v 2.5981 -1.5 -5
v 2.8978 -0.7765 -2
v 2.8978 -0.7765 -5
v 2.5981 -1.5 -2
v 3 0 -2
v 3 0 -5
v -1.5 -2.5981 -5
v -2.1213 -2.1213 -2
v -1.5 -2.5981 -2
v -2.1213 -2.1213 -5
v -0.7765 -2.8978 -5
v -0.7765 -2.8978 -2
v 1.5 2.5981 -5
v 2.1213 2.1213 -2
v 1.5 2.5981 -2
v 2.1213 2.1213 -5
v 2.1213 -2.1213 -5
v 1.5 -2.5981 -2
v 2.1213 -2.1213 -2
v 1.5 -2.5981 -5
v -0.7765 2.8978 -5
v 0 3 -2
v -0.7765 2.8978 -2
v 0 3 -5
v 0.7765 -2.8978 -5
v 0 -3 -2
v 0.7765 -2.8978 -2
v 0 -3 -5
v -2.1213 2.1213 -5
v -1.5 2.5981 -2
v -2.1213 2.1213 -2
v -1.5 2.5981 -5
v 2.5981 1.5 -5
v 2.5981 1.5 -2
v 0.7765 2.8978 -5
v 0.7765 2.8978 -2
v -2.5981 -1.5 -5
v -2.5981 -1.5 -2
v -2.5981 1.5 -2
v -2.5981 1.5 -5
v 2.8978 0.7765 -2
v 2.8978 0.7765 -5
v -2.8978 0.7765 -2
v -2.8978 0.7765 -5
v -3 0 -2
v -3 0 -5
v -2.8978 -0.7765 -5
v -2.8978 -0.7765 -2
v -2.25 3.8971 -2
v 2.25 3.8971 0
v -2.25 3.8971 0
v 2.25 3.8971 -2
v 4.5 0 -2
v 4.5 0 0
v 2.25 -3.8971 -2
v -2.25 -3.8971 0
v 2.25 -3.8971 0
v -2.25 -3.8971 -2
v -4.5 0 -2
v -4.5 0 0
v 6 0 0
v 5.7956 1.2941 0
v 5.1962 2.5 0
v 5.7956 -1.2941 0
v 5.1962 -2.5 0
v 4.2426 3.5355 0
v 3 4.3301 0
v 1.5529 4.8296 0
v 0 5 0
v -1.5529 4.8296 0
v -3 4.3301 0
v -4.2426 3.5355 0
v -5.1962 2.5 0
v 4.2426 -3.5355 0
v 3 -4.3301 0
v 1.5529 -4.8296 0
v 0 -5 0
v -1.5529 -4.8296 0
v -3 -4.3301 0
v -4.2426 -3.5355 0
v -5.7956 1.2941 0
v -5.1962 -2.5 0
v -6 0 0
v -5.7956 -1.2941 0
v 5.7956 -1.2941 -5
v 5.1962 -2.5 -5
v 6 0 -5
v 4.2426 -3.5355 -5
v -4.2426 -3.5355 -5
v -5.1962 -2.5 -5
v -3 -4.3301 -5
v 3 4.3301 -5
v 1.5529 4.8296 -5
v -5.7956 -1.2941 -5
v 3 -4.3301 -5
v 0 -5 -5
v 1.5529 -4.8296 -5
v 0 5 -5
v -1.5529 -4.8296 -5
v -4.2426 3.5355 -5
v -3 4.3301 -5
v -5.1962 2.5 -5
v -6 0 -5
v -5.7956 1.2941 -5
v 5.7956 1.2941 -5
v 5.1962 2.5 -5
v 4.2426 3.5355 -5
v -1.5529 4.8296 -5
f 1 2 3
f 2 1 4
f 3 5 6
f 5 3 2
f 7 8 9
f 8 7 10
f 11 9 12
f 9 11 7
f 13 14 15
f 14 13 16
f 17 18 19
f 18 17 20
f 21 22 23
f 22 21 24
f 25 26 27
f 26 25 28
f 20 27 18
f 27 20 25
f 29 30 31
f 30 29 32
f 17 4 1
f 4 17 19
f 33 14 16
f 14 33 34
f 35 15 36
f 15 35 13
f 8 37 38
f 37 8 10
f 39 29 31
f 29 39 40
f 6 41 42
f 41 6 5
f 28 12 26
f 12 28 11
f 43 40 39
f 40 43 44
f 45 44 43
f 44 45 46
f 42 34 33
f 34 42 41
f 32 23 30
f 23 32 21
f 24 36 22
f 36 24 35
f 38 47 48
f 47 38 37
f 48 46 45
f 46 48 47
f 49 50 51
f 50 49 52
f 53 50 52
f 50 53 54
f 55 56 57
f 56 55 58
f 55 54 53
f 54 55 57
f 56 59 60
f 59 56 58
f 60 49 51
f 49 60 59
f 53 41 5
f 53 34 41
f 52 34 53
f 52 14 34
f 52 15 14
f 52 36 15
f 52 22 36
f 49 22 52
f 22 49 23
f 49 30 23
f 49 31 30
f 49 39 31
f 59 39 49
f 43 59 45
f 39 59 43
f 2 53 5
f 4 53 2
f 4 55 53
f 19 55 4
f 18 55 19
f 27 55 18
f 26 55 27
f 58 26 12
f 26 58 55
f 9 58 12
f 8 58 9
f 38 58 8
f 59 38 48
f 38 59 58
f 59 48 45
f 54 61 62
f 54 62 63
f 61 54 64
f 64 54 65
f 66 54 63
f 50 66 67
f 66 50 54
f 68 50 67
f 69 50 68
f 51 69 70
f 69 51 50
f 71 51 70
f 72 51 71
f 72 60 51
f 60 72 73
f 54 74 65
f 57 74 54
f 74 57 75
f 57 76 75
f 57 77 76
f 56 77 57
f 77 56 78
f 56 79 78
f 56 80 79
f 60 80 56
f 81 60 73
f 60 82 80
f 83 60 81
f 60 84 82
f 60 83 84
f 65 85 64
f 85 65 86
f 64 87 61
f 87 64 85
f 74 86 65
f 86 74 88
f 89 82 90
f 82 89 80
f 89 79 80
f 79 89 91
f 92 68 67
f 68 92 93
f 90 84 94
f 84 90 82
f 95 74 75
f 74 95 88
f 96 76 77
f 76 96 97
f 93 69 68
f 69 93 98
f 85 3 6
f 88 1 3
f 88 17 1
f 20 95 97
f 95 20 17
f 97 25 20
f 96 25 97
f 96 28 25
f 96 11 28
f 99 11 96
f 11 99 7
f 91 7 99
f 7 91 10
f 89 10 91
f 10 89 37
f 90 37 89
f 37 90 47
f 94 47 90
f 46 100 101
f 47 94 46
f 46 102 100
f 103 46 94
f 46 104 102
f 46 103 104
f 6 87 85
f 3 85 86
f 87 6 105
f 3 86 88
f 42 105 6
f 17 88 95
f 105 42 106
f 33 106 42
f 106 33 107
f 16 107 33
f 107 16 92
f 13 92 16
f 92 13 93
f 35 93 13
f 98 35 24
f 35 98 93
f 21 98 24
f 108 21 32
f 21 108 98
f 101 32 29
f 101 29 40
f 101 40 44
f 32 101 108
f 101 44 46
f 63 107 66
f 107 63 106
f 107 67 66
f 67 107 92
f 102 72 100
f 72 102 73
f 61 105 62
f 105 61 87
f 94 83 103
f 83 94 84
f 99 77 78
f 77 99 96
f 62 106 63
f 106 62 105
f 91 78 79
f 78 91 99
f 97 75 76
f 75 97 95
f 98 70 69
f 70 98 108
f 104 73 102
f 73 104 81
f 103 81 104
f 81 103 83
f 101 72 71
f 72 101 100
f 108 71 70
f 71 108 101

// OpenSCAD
// file: nut-header.scad
// Bolt holder for Topeak adjustable bottle cage

// Copyright (C) 2016 Embecosm Limited (www.embecosm.com)

// Contributor: Jeremy Bennett <jeremy.bennett@embecosm.com>

// This file is licensed under the Creative Commons Attribution-ShareAlike 3.0
// Unported License. To view a copy of this license, visit
// http://creativecommons.org/licenses/by-sa/3.0/ or send a letter to Creative
// Commons, PO Box 1866, Mountain View, CA 94042, USA.


// This is the common header

SPILL = 0.5;			// Allowance for flow of plastic
DELTA = 0.01;

BLOCK_D_X = 13 - SPILL *2;
BLOCK_D_Y = 11 - SPILL * 2;
HOLE_H = 3;
NUT_H = 2;
NUT_D = 8 + SPILL * 2;
HOLE_D = 5 + SPILL * 2;
WASHER_D = 20 - SPILL * 2;
WASHER_H = 2;
LUG_X = 4 - SPILL * 2;
LUG_Y = 2 - SPILL * 2;
LUG_H = 1;
LOCK_NUT_X = 15 + SPILL * 2;
LOCK_NUT_Y = 7 + SPILL * 2;
LOCK_NUT_H = 3;
LOCK_H = LOCK_NUT_H + 2;
HANDLE_Y = 3 - SPILL * 2;
HANDLE_H = 5;
// main file
// Bolt holder for Topeak adjustable bottle cage

// Copyright (C) 2016 Embecosm Limited (www.embecosm.com)

// Contributor: Jeremy Bennett <jeremy.bennett@embecosm.com>

// This file is licensed under the Creative Commons Attribution-ShareAlike 3.0
// Unported License. To view a copy of this license, visit
// http://creativecommons.org/licenses/by-sa/3.0/ or send a letter to Creative
// Commons, PO Box 1866, Mountain View, CA 94042, USA.


// This is the holder for the inner nut

include <nut-header.scad>


module hole () {
    translate (v = [0, 0, -DELTA])
        cylinder (r = HOLE_D / 2, h = HOLE_H + NUT_H + DELTA * 2, $fn = 24,
                  center = false);
    cylinder (r = NUT_D / 2, h = NUT_H, $fn = 6, center = false);
}

module nut_block () {
    scale (v = [BLOCK_D_X / BLOCK_D_Y, 1.0, 1.0])
        cylinder (r = BLOCK_D_Y / 2, h = HOLE_H + NUT_H, $fn = 24,
                  center = false);
}

module nut_holder () {
    rotate (a = [180, 0, 0])
        difference () {
            nut_block ();
            hole ();
        }
}

nut_holder ();
